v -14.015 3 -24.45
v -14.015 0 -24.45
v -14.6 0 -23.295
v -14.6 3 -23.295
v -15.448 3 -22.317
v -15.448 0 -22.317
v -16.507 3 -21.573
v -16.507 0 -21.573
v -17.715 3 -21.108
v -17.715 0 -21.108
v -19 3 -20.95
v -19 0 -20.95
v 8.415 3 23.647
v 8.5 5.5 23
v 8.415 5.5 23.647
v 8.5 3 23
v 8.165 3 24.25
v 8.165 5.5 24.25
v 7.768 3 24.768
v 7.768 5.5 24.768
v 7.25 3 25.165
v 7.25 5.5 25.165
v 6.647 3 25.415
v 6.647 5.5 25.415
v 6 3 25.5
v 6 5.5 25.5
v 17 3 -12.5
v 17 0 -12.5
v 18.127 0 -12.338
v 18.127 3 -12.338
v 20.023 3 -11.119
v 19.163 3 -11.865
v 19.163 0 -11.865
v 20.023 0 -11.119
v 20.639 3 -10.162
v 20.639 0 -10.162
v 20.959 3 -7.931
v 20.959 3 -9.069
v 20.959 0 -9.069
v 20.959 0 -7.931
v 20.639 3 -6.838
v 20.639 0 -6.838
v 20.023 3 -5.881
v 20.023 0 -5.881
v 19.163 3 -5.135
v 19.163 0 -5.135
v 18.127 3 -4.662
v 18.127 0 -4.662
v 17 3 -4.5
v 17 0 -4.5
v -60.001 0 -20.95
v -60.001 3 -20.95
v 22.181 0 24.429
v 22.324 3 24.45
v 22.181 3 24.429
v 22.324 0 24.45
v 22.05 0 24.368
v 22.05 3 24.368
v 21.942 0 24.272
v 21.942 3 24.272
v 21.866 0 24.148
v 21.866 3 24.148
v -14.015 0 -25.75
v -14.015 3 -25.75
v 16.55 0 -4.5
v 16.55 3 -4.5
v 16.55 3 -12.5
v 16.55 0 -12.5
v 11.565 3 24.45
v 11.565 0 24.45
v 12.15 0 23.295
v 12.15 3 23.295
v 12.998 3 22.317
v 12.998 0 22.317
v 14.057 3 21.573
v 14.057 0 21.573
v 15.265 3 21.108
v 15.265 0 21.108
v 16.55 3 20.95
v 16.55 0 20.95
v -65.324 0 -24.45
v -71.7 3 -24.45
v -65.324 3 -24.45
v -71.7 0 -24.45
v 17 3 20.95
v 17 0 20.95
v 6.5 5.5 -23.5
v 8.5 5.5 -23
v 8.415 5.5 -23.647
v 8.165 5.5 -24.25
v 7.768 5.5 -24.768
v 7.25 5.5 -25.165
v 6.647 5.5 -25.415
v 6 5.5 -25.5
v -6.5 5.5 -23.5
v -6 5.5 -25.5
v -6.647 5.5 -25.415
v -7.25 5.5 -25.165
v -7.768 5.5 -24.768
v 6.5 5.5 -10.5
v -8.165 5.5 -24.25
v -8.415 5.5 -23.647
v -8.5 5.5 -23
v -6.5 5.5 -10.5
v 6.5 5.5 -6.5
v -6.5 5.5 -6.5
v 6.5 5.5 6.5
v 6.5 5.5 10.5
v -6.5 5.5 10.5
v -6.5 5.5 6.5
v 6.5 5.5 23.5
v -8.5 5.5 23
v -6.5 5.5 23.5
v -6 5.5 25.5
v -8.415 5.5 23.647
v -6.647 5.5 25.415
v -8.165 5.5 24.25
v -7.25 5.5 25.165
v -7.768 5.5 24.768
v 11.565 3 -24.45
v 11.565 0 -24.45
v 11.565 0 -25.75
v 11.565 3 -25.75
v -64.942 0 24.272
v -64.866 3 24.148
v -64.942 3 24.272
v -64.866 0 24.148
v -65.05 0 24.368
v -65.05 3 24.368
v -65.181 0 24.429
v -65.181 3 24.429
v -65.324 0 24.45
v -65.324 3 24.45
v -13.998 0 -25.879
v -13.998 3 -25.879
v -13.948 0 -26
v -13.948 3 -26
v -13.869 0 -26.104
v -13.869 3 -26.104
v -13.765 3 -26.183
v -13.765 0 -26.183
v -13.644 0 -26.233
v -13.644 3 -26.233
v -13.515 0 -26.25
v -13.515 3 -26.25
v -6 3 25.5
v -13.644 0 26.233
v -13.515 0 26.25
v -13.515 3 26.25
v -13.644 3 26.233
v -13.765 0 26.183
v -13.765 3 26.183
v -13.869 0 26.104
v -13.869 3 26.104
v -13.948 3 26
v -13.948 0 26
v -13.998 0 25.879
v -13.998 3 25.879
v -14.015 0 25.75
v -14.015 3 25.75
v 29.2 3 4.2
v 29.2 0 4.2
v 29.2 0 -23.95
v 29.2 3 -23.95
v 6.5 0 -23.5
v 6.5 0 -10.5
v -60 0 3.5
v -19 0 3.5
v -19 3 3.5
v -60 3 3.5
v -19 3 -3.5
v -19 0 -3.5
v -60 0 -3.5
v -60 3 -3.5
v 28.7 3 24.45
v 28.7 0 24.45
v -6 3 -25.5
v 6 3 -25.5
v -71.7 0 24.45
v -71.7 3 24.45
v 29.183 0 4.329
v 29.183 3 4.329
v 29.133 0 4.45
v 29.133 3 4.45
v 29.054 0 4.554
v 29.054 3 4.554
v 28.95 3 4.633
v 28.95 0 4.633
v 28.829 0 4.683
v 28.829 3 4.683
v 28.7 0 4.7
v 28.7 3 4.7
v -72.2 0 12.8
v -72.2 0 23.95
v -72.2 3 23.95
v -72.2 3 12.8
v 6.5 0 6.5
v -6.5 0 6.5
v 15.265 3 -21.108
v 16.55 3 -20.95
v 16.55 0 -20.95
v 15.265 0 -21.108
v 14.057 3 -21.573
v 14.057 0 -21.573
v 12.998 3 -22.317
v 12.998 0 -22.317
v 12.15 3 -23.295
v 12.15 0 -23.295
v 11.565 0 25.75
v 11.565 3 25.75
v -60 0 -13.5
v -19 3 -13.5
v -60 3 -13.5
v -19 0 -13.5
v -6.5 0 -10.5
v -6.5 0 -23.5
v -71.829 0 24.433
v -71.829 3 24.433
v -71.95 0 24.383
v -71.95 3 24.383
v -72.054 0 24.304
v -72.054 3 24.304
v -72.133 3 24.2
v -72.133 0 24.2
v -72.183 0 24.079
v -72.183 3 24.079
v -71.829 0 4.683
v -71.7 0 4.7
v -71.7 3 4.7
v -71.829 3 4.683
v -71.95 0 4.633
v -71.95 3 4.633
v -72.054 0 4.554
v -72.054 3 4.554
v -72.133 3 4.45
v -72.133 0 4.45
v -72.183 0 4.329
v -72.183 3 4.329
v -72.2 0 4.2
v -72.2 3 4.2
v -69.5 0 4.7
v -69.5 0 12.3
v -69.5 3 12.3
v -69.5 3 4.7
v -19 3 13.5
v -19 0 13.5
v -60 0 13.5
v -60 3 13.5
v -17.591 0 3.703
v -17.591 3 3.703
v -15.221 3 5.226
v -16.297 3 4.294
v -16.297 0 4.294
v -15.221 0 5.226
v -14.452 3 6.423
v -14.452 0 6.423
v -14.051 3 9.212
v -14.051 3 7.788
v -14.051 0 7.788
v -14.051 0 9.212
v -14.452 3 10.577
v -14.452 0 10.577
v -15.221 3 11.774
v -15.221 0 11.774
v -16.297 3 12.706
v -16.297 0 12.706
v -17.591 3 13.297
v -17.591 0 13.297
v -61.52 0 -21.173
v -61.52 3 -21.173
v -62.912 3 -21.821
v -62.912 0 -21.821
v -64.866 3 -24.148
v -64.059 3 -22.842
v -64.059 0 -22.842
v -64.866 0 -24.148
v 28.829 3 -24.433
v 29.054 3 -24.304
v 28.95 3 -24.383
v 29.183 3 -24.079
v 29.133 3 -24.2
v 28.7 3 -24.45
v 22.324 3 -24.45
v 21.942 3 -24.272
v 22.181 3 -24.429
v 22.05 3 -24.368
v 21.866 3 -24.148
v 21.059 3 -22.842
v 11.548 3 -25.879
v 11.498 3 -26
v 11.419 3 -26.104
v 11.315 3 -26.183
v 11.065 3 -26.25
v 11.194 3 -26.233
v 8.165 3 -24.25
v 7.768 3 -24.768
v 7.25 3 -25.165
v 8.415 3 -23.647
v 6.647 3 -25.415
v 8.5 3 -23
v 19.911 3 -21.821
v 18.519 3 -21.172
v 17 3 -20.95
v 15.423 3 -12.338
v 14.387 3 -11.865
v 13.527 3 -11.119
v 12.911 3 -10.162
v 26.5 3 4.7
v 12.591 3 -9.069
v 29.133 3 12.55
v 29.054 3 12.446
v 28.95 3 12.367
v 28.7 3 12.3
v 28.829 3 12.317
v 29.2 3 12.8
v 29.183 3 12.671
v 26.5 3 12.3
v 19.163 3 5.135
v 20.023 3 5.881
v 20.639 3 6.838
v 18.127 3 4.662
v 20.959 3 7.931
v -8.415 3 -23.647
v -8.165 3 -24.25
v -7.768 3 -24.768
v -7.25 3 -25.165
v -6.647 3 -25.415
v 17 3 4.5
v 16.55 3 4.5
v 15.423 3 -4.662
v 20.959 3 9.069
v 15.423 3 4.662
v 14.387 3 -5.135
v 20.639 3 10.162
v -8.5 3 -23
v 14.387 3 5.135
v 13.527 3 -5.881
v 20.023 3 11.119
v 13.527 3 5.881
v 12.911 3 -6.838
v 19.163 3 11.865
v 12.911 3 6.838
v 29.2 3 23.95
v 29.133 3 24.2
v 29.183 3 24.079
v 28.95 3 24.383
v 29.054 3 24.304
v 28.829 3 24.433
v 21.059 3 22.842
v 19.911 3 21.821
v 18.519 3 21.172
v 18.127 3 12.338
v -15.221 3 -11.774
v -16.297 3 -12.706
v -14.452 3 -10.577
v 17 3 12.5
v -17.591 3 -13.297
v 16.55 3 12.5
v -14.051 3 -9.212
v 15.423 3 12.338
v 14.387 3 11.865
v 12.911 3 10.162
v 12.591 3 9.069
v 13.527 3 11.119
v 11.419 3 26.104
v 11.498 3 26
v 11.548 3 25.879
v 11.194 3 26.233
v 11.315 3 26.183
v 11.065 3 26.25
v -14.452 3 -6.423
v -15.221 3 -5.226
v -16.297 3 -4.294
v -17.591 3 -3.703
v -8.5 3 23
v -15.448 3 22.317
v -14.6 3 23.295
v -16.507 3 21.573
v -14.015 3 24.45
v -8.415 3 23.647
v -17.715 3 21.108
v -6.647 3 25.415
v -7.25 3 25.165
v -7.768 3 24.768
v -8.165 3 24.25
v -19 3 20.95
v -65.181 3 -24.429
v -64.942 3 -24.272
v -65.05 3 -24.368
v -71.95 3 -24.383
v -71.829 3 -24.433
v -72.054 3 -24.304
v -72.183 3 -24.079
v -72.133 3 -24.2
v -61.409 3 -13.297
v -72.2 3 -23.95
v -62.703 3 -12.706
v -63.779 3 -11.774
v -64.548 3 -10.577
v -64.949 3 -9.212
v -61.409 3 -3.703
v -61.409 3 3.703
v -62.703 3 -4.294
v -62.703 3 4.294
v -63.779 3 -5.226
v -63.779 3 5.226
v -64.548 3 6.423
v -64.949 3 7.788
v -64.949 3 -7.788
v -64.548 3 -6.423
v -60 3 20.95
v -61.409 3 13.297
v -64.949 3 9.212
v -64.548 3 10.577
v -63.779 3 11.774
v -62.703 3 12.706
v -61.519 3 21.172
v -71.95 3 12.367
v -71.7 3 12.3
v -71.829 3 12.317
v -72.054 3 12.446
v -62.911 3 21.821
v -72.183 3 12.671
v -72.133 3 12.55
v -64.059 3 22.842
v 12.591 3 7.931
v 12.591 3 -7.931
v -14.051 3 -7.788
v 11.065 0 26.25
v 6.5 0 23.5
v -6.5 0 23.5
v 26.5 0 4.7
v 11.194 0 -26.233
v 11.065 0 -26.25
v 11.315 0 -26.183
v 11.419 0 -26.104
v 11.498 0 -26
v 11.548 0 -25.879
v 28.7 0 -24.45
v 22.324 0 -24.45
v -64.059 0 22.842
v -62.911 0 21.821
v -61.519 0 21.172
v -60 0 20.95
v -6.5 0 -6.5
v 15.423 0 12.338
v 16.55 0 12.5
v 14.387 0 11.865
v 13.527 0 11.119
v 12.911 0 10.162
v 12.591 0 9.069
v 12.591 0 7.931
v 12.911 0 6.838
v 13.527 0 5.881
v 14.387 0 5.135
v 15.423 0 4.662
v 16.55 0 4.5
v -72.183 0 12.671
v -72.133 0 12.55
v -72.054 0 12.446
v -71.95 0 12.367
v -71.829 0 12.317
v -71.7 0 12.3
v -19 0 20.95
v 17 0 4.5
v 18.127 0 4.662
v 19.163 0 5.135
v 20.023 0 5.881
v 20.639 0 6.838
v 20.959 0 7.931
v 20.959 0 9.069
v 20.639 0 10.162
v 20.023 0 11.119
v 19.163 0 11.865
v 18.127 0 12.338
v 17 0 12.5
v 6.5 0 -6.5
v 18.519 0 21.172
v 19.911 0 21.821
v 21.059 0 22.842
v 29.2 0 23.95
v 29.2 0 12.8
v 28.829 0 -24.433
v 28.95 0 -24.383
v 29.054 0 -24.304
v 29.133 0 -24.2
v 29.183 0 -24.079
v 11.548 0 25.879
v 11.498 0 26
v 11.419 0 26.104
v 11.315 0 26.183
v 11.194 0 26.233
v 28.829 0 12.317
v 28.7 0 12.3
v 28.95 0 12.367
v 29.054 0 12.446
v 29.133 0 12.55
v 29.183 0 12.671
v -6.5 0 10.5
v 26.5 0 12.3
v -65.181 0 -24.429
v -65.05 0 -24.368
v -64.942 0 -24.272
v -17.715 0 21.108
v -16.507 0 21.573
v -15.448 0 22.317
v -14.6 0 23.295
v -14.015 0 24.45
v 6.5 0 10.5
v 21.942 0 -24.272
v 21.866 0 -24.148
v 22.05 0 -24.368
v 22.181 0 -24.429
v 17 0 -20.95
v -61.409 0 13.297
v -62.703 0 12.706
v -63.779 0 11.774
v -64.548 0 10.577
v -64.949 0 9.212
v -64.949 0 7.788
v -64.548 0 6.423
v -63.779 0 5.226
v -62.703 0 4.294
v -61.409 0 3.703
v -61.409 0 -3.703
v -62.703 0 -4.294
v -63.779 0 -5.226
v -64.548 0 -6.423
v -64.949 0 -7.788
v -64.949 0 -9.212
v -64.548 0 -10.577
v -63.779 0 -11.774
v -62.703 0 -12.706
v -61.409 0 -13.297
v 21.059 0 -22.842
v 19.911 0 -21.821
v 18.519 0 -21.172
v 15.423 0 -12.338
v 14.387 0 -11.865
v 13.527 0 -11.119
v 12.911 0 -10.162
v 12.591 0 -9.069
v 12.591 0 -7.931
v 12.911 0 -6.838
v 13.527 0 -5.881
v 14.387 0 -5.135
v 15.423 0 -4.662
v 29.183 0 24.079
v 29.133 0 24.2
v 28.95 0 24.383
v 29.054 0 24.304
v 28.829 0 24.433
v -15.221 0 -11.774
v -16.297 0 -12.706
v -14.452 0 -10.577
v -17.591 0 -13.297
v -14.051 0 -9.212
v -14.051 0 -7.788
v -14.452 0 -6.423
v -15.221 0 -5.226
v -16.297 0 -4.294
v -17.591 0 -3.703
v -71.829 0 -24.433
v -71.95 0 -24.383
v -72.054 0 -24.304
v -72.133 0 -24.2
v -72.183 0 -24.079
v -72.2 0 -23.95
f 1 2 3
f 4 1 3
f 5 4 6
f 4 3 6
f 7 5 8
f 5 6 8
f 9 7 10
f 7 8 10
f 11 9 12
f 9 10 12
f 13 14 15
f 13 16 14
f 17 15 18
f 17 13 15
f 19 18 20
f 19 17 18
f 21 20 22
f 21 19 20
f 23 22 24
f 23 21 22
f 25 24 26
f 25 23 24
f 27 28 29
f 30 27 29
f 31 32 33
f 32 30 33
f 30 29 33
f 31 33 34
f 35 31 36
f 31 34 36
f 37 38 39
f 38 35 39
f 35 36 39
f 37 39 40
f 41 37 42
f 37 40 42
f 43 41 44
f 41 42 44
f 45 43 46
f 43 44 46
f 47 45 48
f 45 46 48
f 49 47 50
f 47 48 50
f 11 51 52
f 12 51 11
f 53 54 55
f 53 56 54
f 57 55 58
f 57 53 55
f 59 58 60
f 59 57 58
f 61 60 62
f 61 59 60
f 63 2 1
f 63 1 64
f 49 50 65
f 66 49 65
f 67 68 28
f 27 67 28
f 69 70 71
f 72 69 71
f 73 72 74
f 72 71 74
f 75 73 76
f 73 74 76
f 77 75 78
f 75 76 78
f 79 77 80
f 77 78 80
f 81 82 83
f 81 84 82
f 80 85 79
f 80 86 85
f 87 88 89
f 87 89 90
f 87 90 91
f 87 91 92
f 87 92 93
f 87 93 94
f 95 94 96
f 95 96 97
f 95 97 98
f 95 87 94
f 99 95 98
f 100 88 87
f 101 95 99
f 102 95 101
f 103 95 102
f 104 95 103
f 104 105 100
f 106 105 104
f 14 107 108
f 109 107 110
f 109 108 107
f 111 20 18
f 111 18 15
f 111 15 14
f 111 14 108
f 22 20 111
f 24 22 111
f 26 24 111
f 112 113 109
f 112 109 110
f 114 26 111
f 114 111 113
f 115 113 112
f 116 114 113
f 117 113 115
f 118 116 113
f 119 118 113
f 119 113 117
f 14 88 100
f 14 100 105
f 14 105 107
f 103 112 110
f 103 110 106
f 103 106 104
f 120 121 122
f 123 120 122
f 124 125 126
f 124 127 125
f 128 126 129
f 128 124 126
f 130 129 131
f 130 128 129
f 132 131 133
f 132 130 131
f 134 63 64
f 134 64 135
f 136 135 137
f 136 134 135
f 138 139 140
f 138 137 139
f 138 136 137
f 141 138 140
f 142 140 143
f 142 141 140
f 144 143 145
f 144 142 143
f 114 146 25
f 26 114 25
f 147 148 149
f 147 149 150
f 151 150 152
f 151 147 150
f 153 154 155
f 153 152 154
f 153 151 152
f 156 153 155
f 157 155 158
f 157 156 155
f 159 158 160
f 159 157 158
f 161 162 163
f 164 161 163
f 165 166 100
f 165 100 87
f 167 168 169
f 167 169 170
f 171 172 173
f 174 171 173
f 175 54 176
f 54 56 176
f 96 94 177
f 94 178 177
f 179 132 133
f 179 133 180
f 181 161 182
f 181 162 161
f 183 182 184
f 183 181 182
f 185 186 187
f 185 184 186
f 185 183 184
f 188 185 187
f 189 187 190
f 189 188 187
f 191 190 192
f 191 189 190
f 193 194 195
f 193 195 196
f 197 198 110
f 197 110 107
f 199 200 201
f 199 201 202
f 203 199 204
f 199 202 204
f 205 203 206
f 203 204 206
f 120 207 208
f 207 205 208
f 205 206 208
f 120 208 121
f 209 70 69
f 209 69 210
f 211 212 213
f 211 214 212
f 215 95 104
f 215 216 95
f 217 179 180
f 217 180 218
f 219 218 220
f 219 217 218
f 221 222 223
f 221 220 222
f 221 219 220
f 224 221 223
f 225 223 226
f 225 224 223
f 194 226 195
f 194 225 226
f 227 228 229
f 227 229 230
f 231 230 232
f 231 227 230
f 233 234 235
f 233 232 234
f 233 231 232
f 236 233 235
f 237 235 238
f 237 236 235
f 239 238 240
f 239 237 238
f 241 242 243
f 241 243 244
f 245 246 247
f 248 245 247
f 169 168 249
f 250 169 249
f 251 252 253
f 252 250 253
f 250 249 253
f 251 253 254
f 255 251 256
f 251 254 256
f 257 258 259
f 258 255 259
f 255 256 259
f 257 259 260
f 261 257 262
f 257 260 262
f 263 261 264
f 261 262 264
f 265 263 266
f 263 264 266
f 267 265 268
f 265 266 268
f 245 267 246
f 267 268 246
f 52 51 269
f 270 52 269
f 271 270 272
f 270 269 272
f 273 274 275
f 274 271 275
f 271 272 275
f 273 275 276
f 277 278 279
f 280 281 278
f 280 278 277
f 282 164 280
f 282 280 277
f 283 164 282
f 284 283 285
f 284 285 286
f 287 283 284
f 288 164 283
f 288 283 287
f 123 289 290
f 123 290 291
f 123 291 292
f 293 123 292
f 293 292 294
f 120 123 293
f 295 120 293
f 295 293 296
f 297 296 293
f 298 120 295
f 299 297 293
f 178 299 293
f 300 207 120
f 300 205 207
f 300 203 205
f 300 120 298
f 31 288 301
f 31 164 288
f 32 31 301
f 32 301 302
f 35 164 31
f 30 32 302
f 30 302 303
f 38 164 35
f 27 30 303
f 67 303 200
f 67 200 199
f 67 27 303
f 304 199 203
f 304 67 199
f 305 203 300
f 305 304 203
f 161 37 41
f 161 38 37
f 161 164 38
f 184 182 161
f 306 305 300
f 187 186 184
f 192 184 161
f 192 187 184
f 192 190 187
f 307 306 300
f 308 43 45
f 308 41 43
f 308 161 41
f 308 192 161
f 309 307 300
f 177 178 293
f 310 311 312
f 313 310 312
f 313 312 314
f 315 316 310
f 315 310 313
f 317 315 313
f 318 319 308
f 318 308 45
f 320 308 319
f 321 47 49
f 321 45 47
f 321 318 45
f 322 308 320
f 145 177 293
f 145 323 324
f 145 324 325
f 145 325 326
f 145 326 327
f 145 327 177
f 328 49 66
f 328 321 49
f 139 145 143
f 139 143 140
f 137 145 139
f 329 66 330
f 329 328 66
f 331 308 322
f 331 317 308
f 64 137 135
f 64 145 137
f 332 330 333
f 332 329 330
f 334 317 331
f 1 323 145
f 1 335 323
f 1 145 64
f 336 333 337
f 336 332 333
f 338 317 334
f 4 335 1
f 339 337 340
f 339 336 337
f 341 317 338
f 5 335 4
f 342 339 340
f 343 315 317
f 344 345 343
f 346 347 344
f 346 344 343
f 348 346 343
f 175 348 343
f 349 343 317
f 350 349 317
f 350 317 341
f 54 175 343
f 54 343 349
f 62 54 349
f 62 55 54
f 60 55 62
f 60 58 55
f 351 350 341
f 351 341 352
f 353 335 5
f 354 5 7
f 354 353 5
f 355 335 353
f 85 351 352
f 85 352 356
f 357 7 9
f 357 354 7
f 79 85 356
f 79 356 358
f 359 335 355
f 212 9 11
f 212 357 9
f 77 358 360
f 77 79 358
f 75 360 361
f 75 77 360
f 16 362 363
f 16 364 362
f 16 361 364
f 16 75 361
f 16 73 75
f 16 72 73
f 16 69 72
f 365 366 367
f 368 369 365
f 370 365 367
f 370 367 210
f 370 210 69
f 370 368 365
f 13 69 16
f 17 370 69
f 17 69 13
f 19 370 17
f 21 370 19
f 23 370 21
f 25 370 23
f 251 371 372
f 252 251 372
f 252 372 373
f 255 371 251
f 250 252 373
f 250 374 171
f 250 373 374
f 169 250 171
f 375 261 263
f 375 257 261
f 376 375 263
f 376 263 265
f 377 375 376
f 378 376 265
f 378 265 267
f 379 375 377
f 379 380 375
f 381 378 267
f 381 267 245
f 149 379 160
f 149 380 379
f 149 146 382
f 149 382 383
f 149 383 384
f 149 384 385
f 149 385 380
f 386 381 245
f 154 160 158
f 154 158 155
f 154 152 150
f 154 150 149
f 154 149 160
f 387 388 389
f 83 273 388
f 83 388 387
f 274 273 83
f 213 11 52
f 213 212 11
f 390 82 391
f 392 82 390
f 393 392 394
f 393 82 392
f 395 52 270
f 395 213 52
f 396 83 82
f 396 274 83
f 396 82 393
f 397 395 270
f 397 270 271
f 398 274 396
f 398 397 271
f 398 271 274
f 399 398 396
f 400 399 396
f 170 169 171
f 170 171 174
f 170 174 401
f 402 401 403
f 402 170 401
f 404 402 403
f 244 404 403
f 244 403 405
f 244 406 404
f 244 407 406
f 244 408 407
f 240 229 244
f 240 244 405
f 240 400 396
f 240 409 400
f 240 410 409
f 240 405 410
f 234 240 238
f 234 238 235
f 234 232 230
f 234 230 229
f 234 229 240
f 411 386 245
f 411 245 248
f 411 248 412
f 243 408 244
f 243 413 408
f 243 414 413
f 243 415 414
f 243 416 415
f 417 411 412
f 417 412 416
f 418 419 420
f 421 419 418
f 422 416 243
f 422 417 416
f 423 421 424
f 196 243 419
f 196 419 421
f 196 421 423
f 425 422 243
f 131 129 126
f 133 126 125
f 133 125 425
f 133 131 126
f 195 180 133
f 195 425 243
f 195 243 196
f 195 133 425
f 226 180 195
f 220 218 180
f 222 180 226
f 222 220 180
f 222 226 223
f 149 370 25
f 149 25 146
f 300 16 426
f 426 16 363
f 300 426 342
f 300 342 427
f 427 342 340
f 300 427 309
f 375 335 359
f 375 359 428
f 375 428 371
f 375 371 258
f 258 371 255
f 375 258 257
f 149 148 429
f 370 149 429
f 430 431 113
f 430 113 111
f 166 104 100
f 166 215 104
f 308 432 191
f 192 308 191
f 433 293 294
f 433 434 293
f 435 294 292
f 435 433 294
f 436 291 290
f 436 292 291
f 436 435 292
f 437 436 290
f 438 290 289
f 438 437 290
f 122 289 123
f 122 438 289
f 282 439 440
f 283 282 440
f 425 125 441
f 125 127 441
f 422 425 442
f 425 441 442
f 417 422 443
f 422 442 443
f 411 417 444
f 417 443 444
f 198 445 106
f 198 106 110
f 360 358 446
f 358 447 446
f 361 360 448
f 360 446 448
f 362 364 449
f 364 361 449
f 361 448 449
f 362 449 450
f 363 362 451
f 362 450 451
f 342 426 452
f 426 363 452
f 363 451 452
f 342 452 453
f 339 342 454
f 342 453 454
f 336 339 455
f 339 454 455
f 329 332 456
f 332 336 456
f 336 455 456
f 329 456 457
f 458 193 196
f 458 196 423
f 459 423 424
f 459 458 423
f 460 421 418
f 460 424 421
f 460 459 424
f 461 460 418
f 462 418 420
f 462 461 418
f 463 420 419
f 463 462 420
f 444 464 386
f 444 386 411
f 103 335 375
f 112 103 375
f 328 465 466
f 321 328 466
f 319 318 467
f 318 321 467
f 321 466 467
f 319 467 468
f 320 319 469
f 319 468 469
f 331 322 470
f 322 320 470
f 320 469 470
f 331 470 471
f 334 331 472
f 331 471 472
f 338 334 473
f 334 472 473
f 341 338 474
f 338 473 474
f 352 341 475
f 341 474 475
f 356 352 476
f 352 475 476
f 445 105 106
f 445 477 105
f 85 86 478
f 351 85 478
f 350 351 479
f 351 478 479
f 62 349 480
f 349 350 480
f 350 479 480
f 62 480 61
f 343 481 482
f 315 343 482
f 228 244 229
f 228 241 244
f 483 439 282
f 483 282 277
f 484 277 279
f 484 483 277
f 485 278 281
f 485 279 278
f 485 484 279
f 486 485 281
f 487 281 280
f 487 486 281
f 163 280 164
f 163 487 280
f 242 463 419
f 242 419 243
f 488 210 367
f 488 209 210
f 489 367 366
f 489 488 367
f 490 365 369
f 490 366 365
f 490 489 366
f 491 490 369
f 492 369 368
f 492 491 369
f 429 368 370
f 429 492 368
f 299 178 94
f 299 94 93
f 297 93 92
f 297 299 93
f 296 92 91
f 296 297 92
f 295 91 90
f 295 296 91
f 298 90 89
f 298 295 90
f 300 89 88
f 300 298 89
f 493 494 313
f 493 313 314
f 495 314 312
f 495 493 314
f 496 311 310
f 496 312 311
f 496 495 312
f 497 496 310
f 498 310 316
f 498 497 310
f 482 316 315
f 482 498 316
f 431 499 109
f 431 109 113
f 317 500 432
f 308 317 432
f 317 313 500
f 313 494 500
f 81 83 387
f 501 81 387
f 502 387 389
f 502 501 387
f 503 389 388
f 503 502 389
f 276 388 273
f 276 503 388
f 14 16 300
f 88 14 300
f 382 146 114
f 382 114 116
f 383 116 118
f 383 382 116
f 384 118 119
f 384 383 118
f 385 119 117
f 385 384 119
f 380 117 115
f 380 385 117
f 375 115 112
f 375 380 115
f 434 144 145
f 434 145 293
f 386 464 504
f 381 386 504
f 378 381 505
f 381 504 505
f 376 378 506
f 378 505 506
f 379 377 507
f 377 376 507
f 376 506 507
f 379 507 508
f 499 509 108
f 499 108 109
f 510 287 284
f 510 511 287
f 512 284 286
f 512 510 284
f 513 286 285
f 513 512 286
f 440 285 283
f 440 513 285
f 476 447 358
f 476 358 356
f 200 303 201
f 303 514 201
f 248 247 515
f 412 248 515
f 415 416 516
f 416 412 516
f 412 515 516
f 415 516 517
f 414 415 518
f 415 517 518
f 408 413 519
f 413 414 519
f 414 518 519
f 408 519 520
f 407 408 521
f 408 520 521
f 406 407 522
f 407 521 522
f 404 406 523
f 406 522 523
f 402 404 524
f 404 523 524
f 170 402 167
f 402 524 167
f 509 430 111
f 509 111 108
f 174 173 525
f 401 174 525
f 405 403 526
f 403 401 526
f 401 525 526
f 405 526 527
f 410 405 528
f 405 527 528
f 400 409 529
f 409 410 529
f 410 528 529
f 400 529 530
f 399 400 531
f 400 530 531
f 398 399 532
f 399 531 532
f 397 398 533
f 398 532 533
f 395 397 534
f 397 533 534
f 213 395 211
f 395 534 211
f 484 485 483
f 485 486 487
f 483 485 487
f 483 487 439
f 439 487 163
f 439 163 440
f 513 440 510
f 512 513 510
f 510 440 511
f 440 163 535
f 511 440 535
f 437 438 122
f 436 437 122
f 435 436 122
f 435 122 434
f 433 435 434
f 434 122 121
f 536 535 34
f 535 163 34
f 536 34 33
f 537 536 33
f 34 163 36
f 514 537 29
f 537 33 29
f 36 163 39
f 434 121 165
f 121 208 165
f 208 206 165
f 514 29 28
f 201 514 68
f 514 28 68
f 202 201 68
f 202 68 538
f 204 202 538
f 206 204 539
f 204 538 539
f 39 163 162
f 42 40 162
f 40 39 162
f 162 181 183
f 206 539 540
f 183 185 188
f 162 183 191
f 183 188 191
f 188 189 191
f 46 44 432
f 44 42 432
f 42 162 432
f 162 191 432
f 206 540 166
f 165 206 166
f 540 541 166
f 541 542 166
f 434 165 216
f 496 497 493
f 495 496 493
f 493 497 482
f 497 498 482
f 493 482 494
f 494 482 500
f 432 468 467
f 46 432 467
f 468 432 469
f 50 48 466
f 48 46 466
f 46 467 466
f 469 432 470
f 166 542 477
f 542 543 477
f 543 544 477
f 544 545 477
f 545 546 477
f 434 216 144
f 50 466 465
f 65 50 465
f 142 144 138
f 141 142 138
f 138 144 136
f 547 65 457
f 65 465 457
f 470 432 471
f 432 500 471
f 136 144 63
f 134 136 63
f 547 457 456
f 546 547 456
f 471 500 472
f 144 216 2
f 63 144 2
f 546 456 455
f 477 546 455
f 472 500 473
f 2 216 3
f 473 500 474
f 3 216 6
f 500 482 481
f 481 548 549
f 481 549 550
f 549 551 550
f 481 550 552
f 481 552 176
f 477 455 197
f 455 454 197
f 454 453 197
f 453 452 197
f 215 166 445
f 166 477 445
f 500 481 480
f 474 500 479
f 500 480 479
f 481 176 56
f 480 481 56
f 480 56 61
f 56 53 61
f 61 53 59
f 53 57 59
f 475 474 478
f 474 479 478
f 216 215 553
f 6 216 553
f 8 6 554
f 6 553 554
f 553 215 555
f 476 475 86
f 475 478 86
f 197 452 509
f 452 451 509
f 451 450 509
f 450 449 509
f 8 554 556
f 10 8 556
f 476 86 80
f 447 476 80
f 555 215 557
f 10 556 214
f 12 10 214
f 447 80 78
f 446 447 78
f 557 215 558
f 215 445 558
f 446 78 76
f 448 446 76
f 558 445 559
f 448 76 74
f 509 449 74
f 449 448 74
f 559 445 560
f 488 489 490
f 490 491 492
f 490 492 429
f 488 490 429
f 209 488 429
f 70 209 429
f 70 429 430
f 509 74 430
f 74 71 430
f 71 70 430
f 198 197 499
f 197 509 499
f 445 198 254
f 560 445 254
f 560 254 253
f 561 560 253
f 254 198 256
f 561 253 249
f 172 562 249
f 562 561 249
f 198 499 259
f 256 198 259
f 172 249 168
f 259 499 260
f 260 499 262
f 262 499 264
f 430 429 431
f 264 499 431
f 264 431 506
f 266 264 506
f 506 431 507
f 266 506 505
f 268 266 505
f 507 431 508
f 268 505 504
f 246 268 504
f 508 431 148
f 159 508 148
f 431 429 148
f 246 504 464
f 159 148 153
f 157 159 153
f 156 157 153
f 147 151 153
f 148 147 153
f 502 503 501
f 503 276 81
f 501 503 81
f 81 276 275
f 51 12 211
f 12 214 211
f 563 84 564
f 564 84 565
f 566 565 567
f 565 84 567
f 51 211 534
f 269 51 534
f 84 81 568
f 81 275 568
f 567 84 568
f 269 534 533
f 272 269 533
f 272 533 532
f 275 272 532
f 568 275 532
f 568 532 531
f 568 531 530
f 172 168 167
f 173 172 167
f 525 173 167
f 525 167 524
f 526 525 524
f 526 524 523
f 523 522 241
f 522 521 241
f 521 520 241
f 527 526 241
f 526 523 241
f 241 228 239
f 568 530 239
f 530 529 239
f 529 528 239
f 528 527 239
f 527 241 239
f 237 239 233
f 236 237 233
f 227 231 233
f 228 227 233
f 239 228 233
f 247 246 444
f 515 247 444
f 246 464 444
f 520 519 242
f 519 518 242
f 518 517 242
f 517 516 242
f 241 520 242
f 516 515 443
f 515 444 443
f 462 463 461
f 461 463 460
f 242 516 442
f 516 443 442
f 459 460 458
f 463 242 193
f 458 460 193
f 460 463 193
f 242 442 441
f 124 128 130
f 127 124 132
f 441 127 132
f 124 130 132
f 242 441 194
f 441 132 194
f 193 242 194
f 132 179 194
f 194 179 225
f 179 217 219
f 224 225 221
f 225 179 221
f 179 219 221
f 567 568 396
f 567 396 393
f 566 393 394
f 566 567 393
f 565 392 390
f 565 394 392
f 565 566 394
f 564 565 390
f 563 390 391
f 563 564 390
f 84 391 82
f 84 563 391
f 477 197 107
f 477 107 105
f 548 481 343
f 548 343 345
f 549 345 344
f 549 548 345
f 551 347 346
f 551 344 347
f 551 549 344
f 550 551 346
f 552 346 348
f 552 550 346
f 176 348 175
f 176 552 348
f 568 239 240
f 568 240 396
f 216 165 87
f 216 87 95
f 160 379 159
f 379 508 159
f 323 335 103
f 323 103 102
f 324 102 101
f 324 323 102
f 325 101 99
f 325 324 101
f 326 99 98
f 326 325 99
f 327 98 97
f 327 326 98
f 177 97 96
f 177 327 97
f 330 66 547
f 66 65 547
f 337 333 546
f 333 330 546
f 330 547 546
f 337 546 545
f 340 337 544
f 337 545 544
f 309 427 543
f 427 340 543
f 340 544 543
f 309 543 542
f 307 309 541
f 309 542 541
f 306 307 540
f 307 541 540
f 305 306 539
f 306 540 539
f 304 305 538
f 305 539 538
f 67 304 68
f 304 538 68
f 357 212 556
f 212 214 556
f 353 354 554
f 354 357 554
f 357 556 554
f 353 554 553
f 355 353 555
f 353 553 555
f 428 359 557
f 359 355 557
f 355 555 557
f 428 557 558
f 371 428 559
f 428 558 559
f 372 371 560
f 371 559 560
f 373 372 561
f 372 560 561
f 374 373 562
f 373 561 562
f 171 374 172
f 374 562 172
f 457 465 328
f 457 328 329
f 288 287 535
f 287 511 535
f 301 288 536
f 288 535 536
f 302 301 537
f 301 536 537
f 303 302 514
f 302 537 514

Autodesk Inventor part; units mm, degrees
ref_plane "YZ Plane" through (0, 0, 0) normal (1, 0, 0) x (0, 1, 0)
ref_plane "XZ Plane" through (0, 0, 0) normal (0, 1, 0) x (-1, 0, 0)
ref_plane "XY Plane" through (0, 0, 0) normal (0, 0, 1) x (1, 0, 0)
sketch "Sketch1" plane through (0, 0, 0) normal (0, 1, 0) x (-1, 0, 0)
  line L0 (6.5, 23.5) -> (-6.5, 23.5)
  line L1 (-6.5, 23.5) -> (-6.5, 10.5)
  line L2 (-6.5, 10.5) -> (6.5, 10.5)
  line L3 (6.5, 10.5) -> (6.5, 23.5)
  line L4 (56.9183, 17) -> (21.35, 17) construction
  line L5 (69.8, -24.75) -> (69.8, -20.1) construction
  line L6 (-26.8, 24.75) -> (-26.8, -24.75) construction
  line L7 (9, 15.5) -> (6.5, 15.5) construction
  line L8 (6.5, 18.5) -> (9, 18.5) construction
  line L9 (-6.5, 15.5) -> (-9, 15.5) construction
  line L10 (-9, 18.5) -> (-6.5, 18.5) construction
  line L11 (-11.8, 18.5) -> (-24.5, 18.5) construction
  line L12 (-11.8, 15.5) -> (-24.5, 15.5) construction
  line L13 (-31, 8.5) -> (74, 8.5) construction
  line L14 (67.5, 20.5) -> (66, 20.5) construction
  line L15 (66, 13.5) -> (67.5, 13.5) construction
  line L16 (-31, 26.25) -> (-31, -26.25) construction
  line L17 (21.35, -8.5) -> (74, -8.5) construction
  line L18 (0, 20.0147) -> (0, -26.25) construction
  line L19 (56.8064, 0) -> (21.35, 0) construction
  line L20 (-6.5, 6.5) -> (-6.5, -6.5)
  line L21 (6.5, 6.5) -> (-6.5, 6.5)
  line L22 (6.5, -6.5) -> (6.5, 6.5)
  line L23 (-6.5, -6.5) -> (6.5, -6.5)
  line L24 (6.5, 1.5) -> (9, 1.5) construction
  line L25 (9, -1.5) -> (6.5, -1.5) construction
  line L26 (67.5, 3.5) -> (66, 3.5) construction
  line L27 (66, -3.5) -> (67.5, -3.5) construction
  line L28 (-6.5, -10.5) -> (-6.5, -23.5)
  line L29 (6.5, -10.5) -> (-6.5, -10.5)
  line L30 (6.5, -23.5) -> (6.5, -10.5)
  line L31 (-6.5, -23.5) -> (6.5, -23.5)
  line L32 (56.3008, -17) -> (21.35, -17) construction
  line L33 (67.5, -13.5) -> (66, -13.5) construction
  line L34 (66, -20.5) -> (67.5, -20.5) construction
  line L35 (9, -18.5) -> (6.5, -18.5) construction
  line L36 (6.5, -15.5) -> (9, -15.5) construction
  line L37 (74, 5) -> (72.5, 5) construction
  line L38 (69.8, 12) -> (72.5, 12) construction
  line L39 (-9, -15.5) -> (-6.5, -15.5) construction
  line L40 (-6.5, -18.5) -> (-9, -18.5) construction
  line L41 (-11.8, -18.5) -> (-24.5, -18.5) construction
  line L42 (-9, 1.5) -> (-6.5, 1.5) construction
  line L43 (-6.5, -1.5) -> (-9, -1.5) construction
  line L44 (-11.8, -1.5) -> (-24.5, -1.5) construction
  line L45 (-29.5, 5) -> (-31, 5) construction
  line L46 (-31, 12) -> (-29.5, 12) construction
  line L47 (67.5, 5.5) -> (66, 5.5) construction
  line L48 (66, 5.5) -> (66, 11.5) construction
  line L49 (66, 11.5) -> (67.5, 11.5) construction
  line L50 (-24.5, 5.5) -> (-23.5, 5.5) construction
  line L51 (-23.5, 5.5) -> (-23.5, 11.5) construction
  line L52 (-23.5, 11.5) -> (-24.5, 11.5) construction
  line L53 (-25, 24.75) -> (-25, 19) construction
  line L54 (-25, 5) -> (-25, 2) construction
  arc A0 (19, 13.5) -> (19, 3.5) centre (19, 8.5) ccw
  arc A1 (60, 3.5) -> (60, 13.5) centre (60, 8.5) ccw
  arc A2 (19, -3.5) -> (19, -13.5) centre (19, -8.5) ccw
  arc A3 (60, -13.5) -> (60, -3.5) centre (60, -8.5) ccw
  line L55 (19, 13.5) -> (60, 13.5)
  line L56 (19, 3.5) -> (60, 3.5)
  line L57 (19, -3.5) -> (60, -3.5)
  line L58 (19, -13.5) -> (60, -13.5)
  arc A4 (-16.55, -12.5) -> (-16.55, -4.5) centre (-16.55, -8.5) ccw
  line L59 (72.5, -24.75) -> (72.5, -19.6) construction
  line L60 (-29.5, 24.75) -> (-29.5, 12) construction
  arc A5 (-17, -4.5) -> (-17, -12.5) centre (-17, -8.5) ccw
  arc A6 (-17, 12.5) -> (-17, 4.5) centre (-17, 8.5) ccw
  line L61 (-16.55, -12.5) -> (-17, -12.5)
  line L62 (-17, -4.5) -> (-16.55, -4.5)
  line L63 (-17, 4.5) -> (-16.5499, 4.5)
  line L64 (-16.55, 12.5) -> (-17, 12.5)
  arc A7 (-16.5499, 4.5) -> (-16.55, 12.5) centre (-16.55, 8.5) ccw
  line L65 (58.8763, -15.5) -> (11.8, -15.5) construction
  line L66 (58.8763, -18.5) -> (11.8, -18.5) construction
  line L67 (58.8763, -1.5) -> (11.8, -1.5) construction
  line L68 (58.8763, 1.5) -> (11.8, 1.5) construction
  line L69 (58.8763, 15.5) -> (11.8, 15.5) construction
  line L70 (58.8763, 18.5) -> (11.8, 18.5) construction
  arc A8 (61, -14.4) -> (58.8763, -15.5) centre (61, -17) ccw construction
  arc A9 (58.8763, -18.5) -> (61, -19.6) centre (61, -17) ccw construction
  arc A10 (61, 2.6) -> (58.8763, 1.5) centre (61, 0) ccw construction
  arc A11 (58.8763, -1.5) -> (61, -2.6) centre (61, 0) ccw construction
  arc A12 (61, 19.6) -> (58.8763, 18.5) centre (61, 17) ccw construction
  arc A13 (58.8763, 15.5) -> (61, 14.4) centre (61, 17) ccw construction
  arc A14 (63.5, -26.25) -> (60, -22.75) centre (60, -26.25) ccw construction
  arc A15 (19, -22.75) -> (15.5, -26.25) centre (19, -26.25) ccw construction
  arc A16 (64.7697, -24.75) -> (60, -21.25) centre (60, -26.25) ccw construction
  line L71 (60, -21.25) -> (19, -21.25) construction
  line L72 (63.5, -26.25) -> (74, -26.25) construction
  line L73 (60, -22.75) -> (19, -22.75) construction
  arc A17 (19, -21.25) -> (14.2303, -24.75) centre (19, -26.25) ccw construction
  arc A18 (14.2303, 24.75) -> (19, 21.25) centre (19, 26.25) ccw construction
  arc A19 (15.5, 26.25) -> (19, 22.75) centre (19, 26.25) ccw construction
  line L74 (60, 22.75) -> (19, 22.75) construction
  line L75 (60, 21.25) -> (19, 21.25) construction
  line L76 (64.7697, 24.75) -> (69.8, 24.75) construction
  line L77 (74, 26.25) -> (63.5, 26.25) construction
  arc A20 (60, 22.75) -> (63.5, 26.25) centre (60, 26.25) ccw construction
  arc A21 (60, 21.25) -> (64.7697, 24.75) centre (60, 26.25) ccw construction
  arc A22 (-13.05, -26.25) -> (-16.55, -22.75) centre (-16.55, -26.25) ccw construction
  arc A23 (-17, -22.75) -> (-20.5, -26.25) centre (-17, -26.25) ccw construction
  line L78 (-16.55, -21.25) -> (-17, -21.25) construction
  line L79 (-16.55, -22.75) -> (-17, -22.75) construction
  arc A24 (-17, -21.25) -> (-21.7697, -24.75) centre (-17, -26.25) ccw construction
  arc A25 (-11.7803, -24.75) -> (-16.55, -21.25) centre (-16.55, -26.25) ccw construction
  line L80 (14.2303, -24.75) -> (-11.7803, -24.75) construction
  line L81 (-21.7697, -24.75) -> (-29.5, -24.75) construction
  line L82 (-31, -26.25) -> (-20.5, -26.25) construction
  line L83 (-13.05, -26.25) -> (15.5, -26.25) construction
  line L84 (-16.55, 21.25) -> (-17, 21.25) construction
  line L85 (-16.55, 22.75) -> (-17, 22.75) construction
  arc A26 (-20.5, 26.25) -> (-17, 22.75) centre (-17, 26.25) ccw construction
  arc A27 (-16.55, 22.75) -> (-13.05, 26.25) centre (-16.55, 26.25) ccw construction
  arc A28 (-21.7697, 24.75) -> (-17, 21.25) centre (-17, 26.25) ccw construction
  arc A29 (-16.55, 21.25) -> (-11.7803, 24.75) centre (-16.55, 26.25) ccw construction
  line L86 (15.5, 26.25) -> (-13.05, 26.25) construction
  line L87 (-20.5, 26.25) -> (-31, 26.25) construction
  line L88 (-29.5, 24.75) -> (-21.7697, 24.75) construction
  line L89 (-11.7803, 24.75) -> (14.2303, 24.75) construction
  line L90 (14.2303, -24.75) -> (14.2303, -26.25) construction
  line L91 (-11.7803, -24.75) -> (-11.7803, -26.25) construction
  line L92 (-11.7803, 24.75) -> (-11.7803, 26.25) construction
  line L93 (14.2303, 24.75) -> (14.2303, 26.25) construction
  line L94 (72.5, 12) -> (74, 12) construction
  line L95 (72.5, 5) -> (69.8, 5) construction
  line L96 (-26.8, 12) -> (-29.5, 12) construction
  line L97 (-26.8, 5) -> (-29.5, 5) construction
  line L98 (11.3, -21) -> (9.5, -21) construction
  line L99 (9.5, -13) -> (11.3, -13) construction
  line L100 (11.3, -4) -> (9.5, -4) construction
  line L101 (9.5, 4) -> (11.3, 4) construction
  line L102 (11.3, 13) -> (9.5, 13) construction
  line L103 (9.5, 21) -> (11.3, 21) construction
  line L104 (-9.5, -21) -> (-11.3, -21) construction
  line L105 (-11.3, -13) -> (-9.5, -13) construction
  line L106 (-9.5, -4) -> (-11.3, -4) construction
  line L107 (-11.3, 4) -> (-9.5, 4) construction
  line L108 (-9.5, 13) -> (-11.3, 13) construction
  line L109 (-11.3, 21) -> (-9.5, 21) construction
  line L110 (11.3, -13) -> (11.3, -15) construction
  line L111 (11.3, -19) -> (11.3, -21) construction
  line L112 (9.5, -21) -> (9.5, -19) construction
  line L113 (9.5, -15) -> (9.5, -13) construction
  line L114 (11.3, 4) -> (11.3, 2) construction
  line L115 (11.3, -2) -> (11.3, -4) construction
  line L116 (9.5, -4) -> (9.5, -2) construction
  line L117 (9.5, 2) -> (9.5, 4) construction
  line L118 (11.3, 21) -> (11.3, 19) construction
  line L119 (11.3, 15) -> (11.3, 13) construction
  line L120 (9.5, 13) -> (9.5, 15) construction
  line L121 (9.5, 19) -> (9.5, 21) construction
  line L122 (-9.5, -13) -> (-9.5, -15) construction
  line L123 (-9.5, -19) -> (-9.5, -21) construction
  line L124 (-11.3, -21) -> (-11.3, -19) construction
  line L125 (-11.3, -15) -> (-11.3, -13) construction
  line L126 (-9.5, 4) -> (-9.5, 2) construction
  line L127 (-9.5, -2) -> (-9.5, -4) construction
  line L128 (-11.3, -4) -> (-11.3, -2) construction
  line L129 (-11.3, 2) -> (-11.3, 4) construction
  line L130 (-9.5, 21) -> (-9.5, 19) construction
  line L131 (-9.5, 15) -> (-9.5, 13) construction
  line L132 (-11.3, 13) -> (-11.3, 15) construction
  line L133 (-11.3, 19) -> (-11.3, 21) construction
  line L134 (67.5, -11.5) -> (66, -11.5) construction
  line L135 (66, -11.5) -> (66, -5.5) construction
  line L136 (66, -5.5) -> (67.5, -5.5) construction
  line L137 (68, -21) -> (68, -24.75) construction
  arc A30 (9.5, -19) -> (9, -18.5) centre (9, -19) ccw construction
  arc A31 (11.8, -18.5) -> (11.3, -19) centre (11.8, -19) ccw construction
  arc A32 (11.3, -15) -> (11.8, -15.5) centre (11.8, -15) ccw construction
  arc A33 (9, -15.5) -> (9.5, -15) centre (9, -15) ccw construction
  arc A34 (9.5, -2) -> (9, -1.5) centre (9, -2) ccw construction
  arc A35 (11.8, -1.5) -> (11.3, -2) centre (11.8, -2) ccw construction
  arc A36 (11.3, 2) -> (11.8, 1.5) centre (11.8, 2) ccw construction
  arc A37 (9, 1.5) -> (9.5, 2) centre (9, 2) ccw construction
  arc A38 (9.5, 15) -> (9, 15.5) centre (9, 15) ccw construction
  arc A39 (11.8, 15.5) -> (11.3, 15) centre (11.8, 15) ccw construction
  arc A40 (11.3, 19) -> (11.8, 18.5) centre (11.8, 19) ccw construction
  arc A41 (9, 18.5) -> (9.5, 19) centre (9, 19) ccw construction
  arc A42 (-9.5, 19) -> (-9, 18.5) centre (-9, 19) ccw construction
  arc A43 (-11.8, 18.5) -> (-11.3, 19) centre (-11.8, 19) ccw construction
  arc A44 (-11.3, 15) -> (-11.8, 15.5) centre (-11.8, 15) ccw construction
  arc A45 (-9, 15.5) -> (-9.5, 15) centre (-9, 15) ccw construction
  arc A46 (-9.5, 2) -> (-9, 1.5) centre (-9, 2) ccw construction
  arc A47 (-11.8, 1.5) -> (-11.3, 2) centre (-11.8, 2) ccw construction
  arc A48 (-11.3, -2) -> (-11.8, -1.5) centre (-11.8, -2) ccw construction
  arc A49 (-9, -1.5) -> (-9.5, -2) centre (-9, -2) ccw construction
  arc A50 (-9.5, -15) -> (-9, -15.5) centre (-9, -15) ccw construction
  arc A51 (-11.8, -15.5) -> (-11.3, -15) centre (-11.8, -15) ccw construction
  arc A52 (-9, -18.5) -> (-9.5, -19) centre (-9, -19) ccw construction
  arc A53 (-11.3, -19) -> (-11.8, -18.5) centre (-11.8, -19) ccw construction
  line L138 (65.5, -19.6) -> (61, -19.6) construction
  line L139 (66, -13.5) -> (66, -13.9) construction
  line L140 (61, -14.4) -> (65.5, -14.4) construction
  line L141 (65.5, -2.6) -> (61, -2.6) construction
  line L142 (66, 3.5) -> (66, 3.1) construction
  line L143 (66, -3.1) -> (66, -3.5) construction
  line L144 (61, 2.6) -> (65.5, 2.6) construction
  line L145 (65.5, 14.4) -> (61, 14.4) construction
  line L146 (66, 20.5) -> (66, 20.1) construction
  line L147 (66, 13.9) -> (66, 13.5) construction
  line L148 (61, 19.6) -> (65.5, 19.6) construction
  arc A54 (65.5, -14.4) -> (66, -13.9) centre (65.5, -13.9) ccw construction
  arc A55 (68, -12) -> (67.5, -11.5) centre (67.5, -12) ccw construction
  arc A56 (67.5, -5.5) -> (68, -5) centre (67.5, -5) ccw construction
  arc A57 (68, 5) -> (67.5, 5.5) centre (67.5, 5) ccw construction
  arc A58 (67.5, 11.5) -> (68, 12) centre (67.5, 12) ccw construction
  arc A59 (66, -3.1) -> (65.5, -2.6) centre (65.5, -3.1) ccw construction
  arc A60 (65.5, 2.6) -> (66, 3.1) centre (65.5, 3.1) ccw construction
  arc A61 (66, 13.9) -> (65.5, 14.4) centre (65.5, 13.9) ccw construction
  arc A62 (65.5, 19.6) -> (66, 20.1) centre (65.5, 20.1) ccw construction
  line L149 (72.5, -2.6) -> (72.5, 2.6) construction
  line L150 (72.5, -2.6) -> (70.3, -2.6) construction
  line L151 (66, -20.5) -> (66, -20.1) construction
  arc A63 (66, -20.1) -> (65.5, -19.6) centre (65.5, -20.1) ccw construction
  line L152 (68, -13) -> (68, -12) construction
  line L153 (68, 4) -> (68, 5) construction
  line L154 (68, 21) -> (68, 24.75) construction
  line L155 (72.5, -19.6) -> (72.5, -14.4) construction
  line L156 (72.5, -19.6) -> (70.3, -19.6) construction
  line L157 (72.5, -24.75) -> (69.8, -24.75) construction
  line L158 (69.8, -24.75) -> (68, -24.75) construction
  line L159 (68, -24.75) -> (64.7697, -24.75) construction
  line L160 (70.3, -14.4) -> (72.5, -14.4) construction
  line L161 (72.5, -14.4) -> (72.5, -2.6) construction
  line L162 (69.8, -13.9) -> (69.8, -3.1) construction
  line L163 (68, -4) -> (68, -5) construction
  line L164 (72.5, 2.6) -> (72.5, 5) construction
  line L165 (70.3, 2.6) -> (72.5, 2.6) construction
  line L166 (69.8, 3.1) -> (69.8, 5) construction
  line L167 (72.5, 14.4) -> (72.5, 19.6) construction
  line L168 (72.5, 14.4) -> (70.3, 14.4) construction
  line L169 (74, -26.25) -> (74, 26.25) construction
  line L170 (72.5, 19.6) -> (72.5, 24.75) construction
  line L171 (69.8, 20.1) -> (69.8, 24.75) construction
  line L172 (70.3, 19.6) -> (72.5, 19.6) construction
  line L173 (72.5, 12) -> (72.5, 14.4) construction
  line L174 (69.8, 24.75) -> (72.5, 24.75) construction
  line L175 (69.8, 12) -> (69.8, 13.9) construction
  line L176 (68, 13) -> (68, 12) construction
  arc A64 (67.5, -13.5) -> (68, -13) centre (67.5, -13) ccw construction
  arc A65 (68, -4) -> (67.5, -3.5) centre (67.5, -4) ccw construction
  arc A66 (67.5, 3.5) -> (68, 4) centre (67.5, 4) ccw construction
  arc A67 (68, 13) -> (67.5, 13.5) centre (67.5, 13) ccw construction
  arc A68 (67.5, 20.5) -> (68, 21) centre (67.5, 21) ccw construction
  arc A69 (70.3, -19.6) -> (69.8, -20.1) centre (70.3, -20.1) ccw construction
  arc A70 (69.8, -13.9) -> (70.3, -14.4) centre (70.3, -13.9) ccw construction
  arc A71 (70.3, -2.6) -> (69.8, -3.1) centre (70.3, -3.1) ccw construction
  arc A72 (69.8, 3.1) -> (70.3, 2.6) centre (70.3, 3.1) ccw construction
  arc A73 (70.3, 14.4) -> (69.8, 13.9) centre (70.3, 13.9) ccw construction
  arc A74 (69.8, 20.1) -> (70.3, 19.6) centre (70.3, 20.1) ccw construction
  line L177 (69.8, 5) -> (69.8, 12) construction
  line L178 (-25, 15) -> (-25, 12) construction
  line L179 (-24.5, 1.5) -> (-11.8, 1.5) construction
  line L180 (-25, -2) -> (-25, -15) construction
  line L181 (-25, -19) -> (-25, -24.75) construction
  line L182 (-24.5, -15.5) -> (-11.8, -15.5) construction
  line L183 (-29.5, 5) -> (-29.5, -24.75) construction
  arc A75 (-25, 19) -> (-24.5, 18.5) centre (-24.5, 19) ccw construction
  arc A76 (-24.5, 15.5) -> (-25, 15) centre (-24.5, 15) ccw construction
  arc A77 (-25, 12) -> (-24.5, 11.5) centre (-24.5, 12) ccw construction
  arc A78 (-24.5, 5.5) -> (-25, 5) centre (-24.5, 5) ccw construction
  arc A79 (-25, 2) -> (-24.5, 1.5) centre (-24.5, 2) ccw construction
  arc A80 (-24.5, -1.5) -> (-25, -2) centre (-24.5, -2) ccw construction
  arc A81 (-25, -15) -> (-24.5, -15.5) centre (-24.5, -15) ccw construction
  arc A82 (-24.5, -18.5) -> (-25, -19) centre (-24.5, -19) ccw construction
  arc A83 (68, -21) -> (67.5, -20.5) centre (67.5, -21) ccw construction
  line L184 (-29.2, 23.95) -> (-29.2, 12.8)
  line L185 (-28.7, 12.3) -> (-26.5, 12.3)
  line L186 (-26.5, 12.3) -> (-26.5, 4.7)
  line L187 (-26.5, 4.7) -> (-28.7, 4.7)
  line L188 (-29.2, 4.2) -> (-29.2, -23.95)
  line L189 (-28.7, -24.45) -> (-22.3245, -24.45)
  line L190 (-11.565, 24.45) -> (14.015, 24.45) construction
  line L191 (19, 20.95) -> (60, 20.95)
  line L192 (65.3245, 24.45) -> (71.7, 24.45)
  line L193 (72.2, 23.95) -> (72.2, 12.8)
  line L194 (71.7, 12.3) -> (69.5, 12.3)
  line L195 (69.5, 12.3) -> (69.5, 4.7)
  line L196 (69.5, 4.7) -> (71.7, 4.7)
  line L197 (72.2, 4.2) -> (72.2, -23.95)
  line L198 (71.7, -24.45) -> (65.3245, -24.45)
  line L199 (60.0007, -20.95) -> (19, -20.95)
  line L200 (-11.565, -24.45) -> (14.015, -24.45) construction
  arc A84 (14.015, 24.45) -> (19, 20.95) centre (19, 26.25) ccw
  arc A85 (19, -20.95) -> (14.015, -24.45) centre (19, -26.25) ccw
  arc A86 (-16.55, 20.95) -> (-11.565, 24.45) centre (-16.55, 26.25) ccw
  arc A87 (-21.8655, 24.1483) -> (-17, 20.95) centre (-17, 26.25) ccw
  arc A88 (-11.565, -24.45) -> (-16.55, -20.95) centre (-16.55, -26.25) ccw
  arc A89 (60, 20.95) -> (64.8655, 24.1483) centre (60, 26.25) ccw
  arc A90 (64.8655, -24.1483) -> (60, -20.95) centre (60, -26.25) ccw
  line L201 (-22.3245, 24.45) -> (-28.7, 24.45)
  line L202 (-17, 20.95) -> (-16.55, 20.95)
  arc A91 (-17, -20.95) -> (-21.8655, -24.1483) centre (-17, -26.25) ccw
  line L203 (-17, -20.95) -> (-16.55, -20.95)
  line L204 (-11.565, 24.45) -> (-11.565, 25.75)
  line L205 (14.015, 24.45) -> (14.015, 25.75)
  line L206 (13.515, 26.25) -> (-11.065, 26.25)
  line L207 (14.015, -24.45) -> (14.015, -25.75)
  line L208 (-11.565, -24.45) -> (-11.565, -25.75)
  line L209 (13.515, -26.25) -> (-11.065, -26.25)
  arc A92 (72.2, 23.95) -> (71.7, 24.45) centre (71.7, 23.95) ccw
  arc A93 (71.7, 12.3) -> (72.2, 12.8) centre (71.7, 12.8) ccw
  arc A94 (72.2, 4.2) -> (71.7, 4.7) centre (71.7, 4.2) ccw
  arc A95 (71.7, -24.45) -> (72.2, -23.95) centre (71.7, -23.95) ccw
  arc A96 (13.515, -26.25) -> (14.015, -25.75) centre (13.515, -25.75) ccw
  arc A97 (-11.565, -25.75) -> (-11.065, -26.25) centre (-11.065, -25.75) ccw
  arc A98 (-29.2, -23.95) -> (-28.7, -24.45) centre (-28.7, -23.95) ccw
  arc A99 (-28.7, 4.7) -> (-29.2, 4.2) centre (-28.7, 4.2) ccw
  arc A100 (-29.2, 12.8) -> (-28.7, 12.3) centre (-28.7, 12.8) ccw
  arc A101 (-28.7, 24.45) -> (-29.2, 23.95) centre (-28.7, 23.95) ccw
  arc A102 (-11.065, 26.25) -> (-11.565, 25.75) centre (-11.065, 25.75) ccw
  arc A103 (14.015, 25.75) -> (13.515, 26.25) centre (13.515, 25.75) ccw
  arc A104 (64.8655, -24.1483) -> (65.3245, -24.45) centre (65.3245, -23.95) ccw
  arc A105 (-22.3245, -24.45) -> (-21.8655, -24.1483) centre (-22.3245, -23.95) ccw
  arc A106 (-21.8655, 24.1483) -> (-22.3245, 24.45) centre (-22.3245, 23.95) ccw
  arc A107 (65.3245, 24.45) -> (64.8655, 24.1483) centre (65.3245, 23.95) ccw
  line L210 (-6, -25.5) -> (6, -25.5)
  line L211 (8.5, -23) -> (8.5, 23)
  line L212 (6, 25.5) -> (-6, 25.5)
  line L213 (-8.5, 23) -> (-8.5, -23)
  line L214 (-8.5, -25.5) -> (8.5, 25.5) construction
  line L215 (8.5, -25.5) -> (-8.5, 25.5) construction
  arc A108 (6, -25.5) -> (8.5, -23) centre (6, -23) ccw
  arc A109 (8.5, 23) -> (6, 25.5) centre (6, 23) ccw
  arc A110 (-6, 25.5) -> (-8.5, 23) centre (-6, 23) ccw
  arc A111 (-8.5, -23) -> (-6, -25.5) centre (-6, -23) ccw
  circle A112 centre (-31, -26.25) radius 6
  circle A113 centre (-31, 26.25) radius 6
  circle A114 centre (74, -26.25) radius 6
  circle A115 centre (74, 26.25) radius 6
  point P0 (0, 0)
  point P1 (0, -17)
  point P2 (0, 0)
  point P3 (0, 17)
  point P4 (72.5, -8.5)
  dimension "d0" = 7
  dimension "d4" = 6
  dimension "d5" = 6
  dimension "d6" = 5
  dimension "d7" = 1.5
  dimension "d8" = 1.5
  dimension "d9" = 1.5
  dimension "d12" = 2.7
  dimension "d13" = 2.7
  dimension "d14" = 7
  dimension "d15" = 7
  dimension "d16" = 25
  dimension "d17" = 5
  dimension "d18" = 1.8
  dimension "d19" = 8
  dimension "d20" = 3
  dimension "d23" = 13
  dimension "d26" = 8
  dimension "d27" = 7
  dimension "d28" = 7
  dimension "d29" = 2
  dimension "d30" = 1.8
  dimension "d31" = 8
  dimension "d32" = 1.8
  dimension "d33" = 2.7
  dimension "d34" = 1.5
  dimension "d35" = 3
  dimension "d36" = 3
  dimension "d37" = 3
  dimension "d38" = 3
  dimension "d39" = 0.5
  dimension "d40" = 68
  dimension "d41" = 5.2
  dimension "d42" = 7
  dimension "d43" = 5.2
  dimension "d44" = 5.2
  dimension "d45" = 1.5
  dimension "d46" = 1.5
  dimension "sb" = 0.3
  dimension "d48" = 0.3
  dimension "d49" = 0.3
  dimension "d50" = 0.3
  dimension "d51" = 0.3
  dimension "d52" = 0.3
  dimension "d54" = 0.3
  dimension "d55" = 0.3
  dimension "d56" = 0.3
  dimension "d57" = 0.3
  dimension "d58" = 10.6
  dimension "d71" = 0.5
  dimension "d76" = 2
  dimension "d77" = 2
  dimension "d78" = 2.5
  dimension "d81" = 17
  dimension "d82" = 17
  dimension "d83" = 49.5
  dimension "d87" = 12
  dimension "d88" = 19
  dimension "d89" = 16.55
  dimension "d91" = 4
extrude "Extrusion1" add sketch "Sketch1" along normal blind 3 contours A101 L201 A113 L184 | A113 L201 A106 A87 L202 A86 L204 A102 L206 A103 L205 A84 L191 A89 A107 L192 A115 L193 A93 L194 L195 L196 A94 L197 A114 L198 A104 A90 L199 A85 L207 A96 L209 A97 L208 A88 L203 A91 A105 L189 A112 L188 A99 L187 L186 L185 A100 L184 | A112 L189 A98 L188 | L192 A92 L193 A115 | A114 L197 A95 L198 | A111 L213 A110 L212 A109 L211 A108 L210 picked at (-28.7631, 21.8652) picked at (-28.7631, -21.8652) picked at (69.6152, 24.0131) picked at (69.6152, -24.0131)
sketch "Sketch2" plane through (0, 3, 0) normal (0, 1, 0) x (1, 0, 0)
  arc A0 (-60, 13.5) -> (-60, 3.5) centre (-60, 8.5) ccw projected
  line L0 (-60, 13.5) -> (-19, 13.5) projected
  arc A1 (-19, 3.5) -> (-19, 13.5) centre (-19, 8.5) ccw projected
  line L1 (-19, 3.5) -> (-60, 3.5) projected
  line L2 (-60, -3.5) -> (-19, -3.5) projected
  arc A2 (-60, -3.5) -> (-60, -13.5) centre (-60, -8.5) ccw projected
  line L3 (-19, -13.5) -> (-60, -13.5) projected
  arc A3 (-19, -13.5) -> (-19, -3.5) centre (-19, -8.5) ccw projected
  arc A4 (16.55, 12.5) -> (16.55, 4.5) centre (16.55, 8.5) ccw projected
  line L4 (16.55, 12.5) -> (17, 12.5) projected
  arc A5 (17, 4.5) -> (17, 12.5) centre (17, 8.5) ccw projected
  line L5 (17, 4.5) -> (16.55, 4.5) projected
  arc A6 (16.5499, -4.5) -> (16.55, -12.5) centre (16.55, -8.5) ccw projected
  line L6 (16.5499, -4.5) -> (17, -4.5) projected
  arc A7 (17, -12.5) -> (17, -4.5) centre (17, -8.5) ccw projected
  line L7 (17, -12.5) -> (16.55, -12.5) projected
  arc A8 (-60, 12.5) -> (-60, 4.5) centre (-60, 8.5) ccw
  arc A9 (-19, 4.5) -> (-19, 12.5) centre (-19, 8.5) ccw
  arc A10 (-60, -4.5) -> (-60, -12.5) centre (-60, -8.5) ccw
  arc A11 (-19, -12.5) -> (-19, -4.5) centre (-19, -8.5) ccw
  arc A12 (16.55, 12.5) -> (16.775, 4.5063) centre (16.55, 8.5) ccw
  arc A13 (16.775, 4.5063) -> (17, 12.5) centre (17, 8.5) ccw
  arc A14 (16.55, -4.5) -> (16.55, -12.5) centre (16.55, -8.5) ccw
  arc A15 (17, -12.5) -> (17, -4.5) centre (17, -8.5) ccw
  line L8 (16.55, -4.5) -> (17, -4.5)
  line L9 (16.55, -12.5) -> (17, -12.5)
  line L10 (16.55, 12.5) -> (17, 12.5)
  line L11 (-60, 12.5) -> (-19, 12.5)
  line L12 (-60, 4.5) -> (-19, 4.5)
  line L13 (-60, -4.5) -> (-19, -4.5)
  line L14 (-60, -12.5) -> (-19, -12.5)
  point P0 (0, 0)
  dimension "d63" = 8
extrude "Extrusion2" [suppressed]
extrude "Extrusion3" add sketch "Sketch1" along normal blind 5.5 contours A111 L213 A110 L212 A109 L211 A108 L210
extrude "Extrusion4" [suppressed]
equation "\"d48\" = sb"
equation "\"d49\" = sb"
equation "\"d50\" = sb"
equation "\"d51\" = sb"
equation "\"d52\" = sb"
equation "\"d54\" = sb"
equation "\"d55\" = sb"
equation "\"d56\" = sb"
equation "\"d57\" = sb"
properties part number "Core_top-im"
